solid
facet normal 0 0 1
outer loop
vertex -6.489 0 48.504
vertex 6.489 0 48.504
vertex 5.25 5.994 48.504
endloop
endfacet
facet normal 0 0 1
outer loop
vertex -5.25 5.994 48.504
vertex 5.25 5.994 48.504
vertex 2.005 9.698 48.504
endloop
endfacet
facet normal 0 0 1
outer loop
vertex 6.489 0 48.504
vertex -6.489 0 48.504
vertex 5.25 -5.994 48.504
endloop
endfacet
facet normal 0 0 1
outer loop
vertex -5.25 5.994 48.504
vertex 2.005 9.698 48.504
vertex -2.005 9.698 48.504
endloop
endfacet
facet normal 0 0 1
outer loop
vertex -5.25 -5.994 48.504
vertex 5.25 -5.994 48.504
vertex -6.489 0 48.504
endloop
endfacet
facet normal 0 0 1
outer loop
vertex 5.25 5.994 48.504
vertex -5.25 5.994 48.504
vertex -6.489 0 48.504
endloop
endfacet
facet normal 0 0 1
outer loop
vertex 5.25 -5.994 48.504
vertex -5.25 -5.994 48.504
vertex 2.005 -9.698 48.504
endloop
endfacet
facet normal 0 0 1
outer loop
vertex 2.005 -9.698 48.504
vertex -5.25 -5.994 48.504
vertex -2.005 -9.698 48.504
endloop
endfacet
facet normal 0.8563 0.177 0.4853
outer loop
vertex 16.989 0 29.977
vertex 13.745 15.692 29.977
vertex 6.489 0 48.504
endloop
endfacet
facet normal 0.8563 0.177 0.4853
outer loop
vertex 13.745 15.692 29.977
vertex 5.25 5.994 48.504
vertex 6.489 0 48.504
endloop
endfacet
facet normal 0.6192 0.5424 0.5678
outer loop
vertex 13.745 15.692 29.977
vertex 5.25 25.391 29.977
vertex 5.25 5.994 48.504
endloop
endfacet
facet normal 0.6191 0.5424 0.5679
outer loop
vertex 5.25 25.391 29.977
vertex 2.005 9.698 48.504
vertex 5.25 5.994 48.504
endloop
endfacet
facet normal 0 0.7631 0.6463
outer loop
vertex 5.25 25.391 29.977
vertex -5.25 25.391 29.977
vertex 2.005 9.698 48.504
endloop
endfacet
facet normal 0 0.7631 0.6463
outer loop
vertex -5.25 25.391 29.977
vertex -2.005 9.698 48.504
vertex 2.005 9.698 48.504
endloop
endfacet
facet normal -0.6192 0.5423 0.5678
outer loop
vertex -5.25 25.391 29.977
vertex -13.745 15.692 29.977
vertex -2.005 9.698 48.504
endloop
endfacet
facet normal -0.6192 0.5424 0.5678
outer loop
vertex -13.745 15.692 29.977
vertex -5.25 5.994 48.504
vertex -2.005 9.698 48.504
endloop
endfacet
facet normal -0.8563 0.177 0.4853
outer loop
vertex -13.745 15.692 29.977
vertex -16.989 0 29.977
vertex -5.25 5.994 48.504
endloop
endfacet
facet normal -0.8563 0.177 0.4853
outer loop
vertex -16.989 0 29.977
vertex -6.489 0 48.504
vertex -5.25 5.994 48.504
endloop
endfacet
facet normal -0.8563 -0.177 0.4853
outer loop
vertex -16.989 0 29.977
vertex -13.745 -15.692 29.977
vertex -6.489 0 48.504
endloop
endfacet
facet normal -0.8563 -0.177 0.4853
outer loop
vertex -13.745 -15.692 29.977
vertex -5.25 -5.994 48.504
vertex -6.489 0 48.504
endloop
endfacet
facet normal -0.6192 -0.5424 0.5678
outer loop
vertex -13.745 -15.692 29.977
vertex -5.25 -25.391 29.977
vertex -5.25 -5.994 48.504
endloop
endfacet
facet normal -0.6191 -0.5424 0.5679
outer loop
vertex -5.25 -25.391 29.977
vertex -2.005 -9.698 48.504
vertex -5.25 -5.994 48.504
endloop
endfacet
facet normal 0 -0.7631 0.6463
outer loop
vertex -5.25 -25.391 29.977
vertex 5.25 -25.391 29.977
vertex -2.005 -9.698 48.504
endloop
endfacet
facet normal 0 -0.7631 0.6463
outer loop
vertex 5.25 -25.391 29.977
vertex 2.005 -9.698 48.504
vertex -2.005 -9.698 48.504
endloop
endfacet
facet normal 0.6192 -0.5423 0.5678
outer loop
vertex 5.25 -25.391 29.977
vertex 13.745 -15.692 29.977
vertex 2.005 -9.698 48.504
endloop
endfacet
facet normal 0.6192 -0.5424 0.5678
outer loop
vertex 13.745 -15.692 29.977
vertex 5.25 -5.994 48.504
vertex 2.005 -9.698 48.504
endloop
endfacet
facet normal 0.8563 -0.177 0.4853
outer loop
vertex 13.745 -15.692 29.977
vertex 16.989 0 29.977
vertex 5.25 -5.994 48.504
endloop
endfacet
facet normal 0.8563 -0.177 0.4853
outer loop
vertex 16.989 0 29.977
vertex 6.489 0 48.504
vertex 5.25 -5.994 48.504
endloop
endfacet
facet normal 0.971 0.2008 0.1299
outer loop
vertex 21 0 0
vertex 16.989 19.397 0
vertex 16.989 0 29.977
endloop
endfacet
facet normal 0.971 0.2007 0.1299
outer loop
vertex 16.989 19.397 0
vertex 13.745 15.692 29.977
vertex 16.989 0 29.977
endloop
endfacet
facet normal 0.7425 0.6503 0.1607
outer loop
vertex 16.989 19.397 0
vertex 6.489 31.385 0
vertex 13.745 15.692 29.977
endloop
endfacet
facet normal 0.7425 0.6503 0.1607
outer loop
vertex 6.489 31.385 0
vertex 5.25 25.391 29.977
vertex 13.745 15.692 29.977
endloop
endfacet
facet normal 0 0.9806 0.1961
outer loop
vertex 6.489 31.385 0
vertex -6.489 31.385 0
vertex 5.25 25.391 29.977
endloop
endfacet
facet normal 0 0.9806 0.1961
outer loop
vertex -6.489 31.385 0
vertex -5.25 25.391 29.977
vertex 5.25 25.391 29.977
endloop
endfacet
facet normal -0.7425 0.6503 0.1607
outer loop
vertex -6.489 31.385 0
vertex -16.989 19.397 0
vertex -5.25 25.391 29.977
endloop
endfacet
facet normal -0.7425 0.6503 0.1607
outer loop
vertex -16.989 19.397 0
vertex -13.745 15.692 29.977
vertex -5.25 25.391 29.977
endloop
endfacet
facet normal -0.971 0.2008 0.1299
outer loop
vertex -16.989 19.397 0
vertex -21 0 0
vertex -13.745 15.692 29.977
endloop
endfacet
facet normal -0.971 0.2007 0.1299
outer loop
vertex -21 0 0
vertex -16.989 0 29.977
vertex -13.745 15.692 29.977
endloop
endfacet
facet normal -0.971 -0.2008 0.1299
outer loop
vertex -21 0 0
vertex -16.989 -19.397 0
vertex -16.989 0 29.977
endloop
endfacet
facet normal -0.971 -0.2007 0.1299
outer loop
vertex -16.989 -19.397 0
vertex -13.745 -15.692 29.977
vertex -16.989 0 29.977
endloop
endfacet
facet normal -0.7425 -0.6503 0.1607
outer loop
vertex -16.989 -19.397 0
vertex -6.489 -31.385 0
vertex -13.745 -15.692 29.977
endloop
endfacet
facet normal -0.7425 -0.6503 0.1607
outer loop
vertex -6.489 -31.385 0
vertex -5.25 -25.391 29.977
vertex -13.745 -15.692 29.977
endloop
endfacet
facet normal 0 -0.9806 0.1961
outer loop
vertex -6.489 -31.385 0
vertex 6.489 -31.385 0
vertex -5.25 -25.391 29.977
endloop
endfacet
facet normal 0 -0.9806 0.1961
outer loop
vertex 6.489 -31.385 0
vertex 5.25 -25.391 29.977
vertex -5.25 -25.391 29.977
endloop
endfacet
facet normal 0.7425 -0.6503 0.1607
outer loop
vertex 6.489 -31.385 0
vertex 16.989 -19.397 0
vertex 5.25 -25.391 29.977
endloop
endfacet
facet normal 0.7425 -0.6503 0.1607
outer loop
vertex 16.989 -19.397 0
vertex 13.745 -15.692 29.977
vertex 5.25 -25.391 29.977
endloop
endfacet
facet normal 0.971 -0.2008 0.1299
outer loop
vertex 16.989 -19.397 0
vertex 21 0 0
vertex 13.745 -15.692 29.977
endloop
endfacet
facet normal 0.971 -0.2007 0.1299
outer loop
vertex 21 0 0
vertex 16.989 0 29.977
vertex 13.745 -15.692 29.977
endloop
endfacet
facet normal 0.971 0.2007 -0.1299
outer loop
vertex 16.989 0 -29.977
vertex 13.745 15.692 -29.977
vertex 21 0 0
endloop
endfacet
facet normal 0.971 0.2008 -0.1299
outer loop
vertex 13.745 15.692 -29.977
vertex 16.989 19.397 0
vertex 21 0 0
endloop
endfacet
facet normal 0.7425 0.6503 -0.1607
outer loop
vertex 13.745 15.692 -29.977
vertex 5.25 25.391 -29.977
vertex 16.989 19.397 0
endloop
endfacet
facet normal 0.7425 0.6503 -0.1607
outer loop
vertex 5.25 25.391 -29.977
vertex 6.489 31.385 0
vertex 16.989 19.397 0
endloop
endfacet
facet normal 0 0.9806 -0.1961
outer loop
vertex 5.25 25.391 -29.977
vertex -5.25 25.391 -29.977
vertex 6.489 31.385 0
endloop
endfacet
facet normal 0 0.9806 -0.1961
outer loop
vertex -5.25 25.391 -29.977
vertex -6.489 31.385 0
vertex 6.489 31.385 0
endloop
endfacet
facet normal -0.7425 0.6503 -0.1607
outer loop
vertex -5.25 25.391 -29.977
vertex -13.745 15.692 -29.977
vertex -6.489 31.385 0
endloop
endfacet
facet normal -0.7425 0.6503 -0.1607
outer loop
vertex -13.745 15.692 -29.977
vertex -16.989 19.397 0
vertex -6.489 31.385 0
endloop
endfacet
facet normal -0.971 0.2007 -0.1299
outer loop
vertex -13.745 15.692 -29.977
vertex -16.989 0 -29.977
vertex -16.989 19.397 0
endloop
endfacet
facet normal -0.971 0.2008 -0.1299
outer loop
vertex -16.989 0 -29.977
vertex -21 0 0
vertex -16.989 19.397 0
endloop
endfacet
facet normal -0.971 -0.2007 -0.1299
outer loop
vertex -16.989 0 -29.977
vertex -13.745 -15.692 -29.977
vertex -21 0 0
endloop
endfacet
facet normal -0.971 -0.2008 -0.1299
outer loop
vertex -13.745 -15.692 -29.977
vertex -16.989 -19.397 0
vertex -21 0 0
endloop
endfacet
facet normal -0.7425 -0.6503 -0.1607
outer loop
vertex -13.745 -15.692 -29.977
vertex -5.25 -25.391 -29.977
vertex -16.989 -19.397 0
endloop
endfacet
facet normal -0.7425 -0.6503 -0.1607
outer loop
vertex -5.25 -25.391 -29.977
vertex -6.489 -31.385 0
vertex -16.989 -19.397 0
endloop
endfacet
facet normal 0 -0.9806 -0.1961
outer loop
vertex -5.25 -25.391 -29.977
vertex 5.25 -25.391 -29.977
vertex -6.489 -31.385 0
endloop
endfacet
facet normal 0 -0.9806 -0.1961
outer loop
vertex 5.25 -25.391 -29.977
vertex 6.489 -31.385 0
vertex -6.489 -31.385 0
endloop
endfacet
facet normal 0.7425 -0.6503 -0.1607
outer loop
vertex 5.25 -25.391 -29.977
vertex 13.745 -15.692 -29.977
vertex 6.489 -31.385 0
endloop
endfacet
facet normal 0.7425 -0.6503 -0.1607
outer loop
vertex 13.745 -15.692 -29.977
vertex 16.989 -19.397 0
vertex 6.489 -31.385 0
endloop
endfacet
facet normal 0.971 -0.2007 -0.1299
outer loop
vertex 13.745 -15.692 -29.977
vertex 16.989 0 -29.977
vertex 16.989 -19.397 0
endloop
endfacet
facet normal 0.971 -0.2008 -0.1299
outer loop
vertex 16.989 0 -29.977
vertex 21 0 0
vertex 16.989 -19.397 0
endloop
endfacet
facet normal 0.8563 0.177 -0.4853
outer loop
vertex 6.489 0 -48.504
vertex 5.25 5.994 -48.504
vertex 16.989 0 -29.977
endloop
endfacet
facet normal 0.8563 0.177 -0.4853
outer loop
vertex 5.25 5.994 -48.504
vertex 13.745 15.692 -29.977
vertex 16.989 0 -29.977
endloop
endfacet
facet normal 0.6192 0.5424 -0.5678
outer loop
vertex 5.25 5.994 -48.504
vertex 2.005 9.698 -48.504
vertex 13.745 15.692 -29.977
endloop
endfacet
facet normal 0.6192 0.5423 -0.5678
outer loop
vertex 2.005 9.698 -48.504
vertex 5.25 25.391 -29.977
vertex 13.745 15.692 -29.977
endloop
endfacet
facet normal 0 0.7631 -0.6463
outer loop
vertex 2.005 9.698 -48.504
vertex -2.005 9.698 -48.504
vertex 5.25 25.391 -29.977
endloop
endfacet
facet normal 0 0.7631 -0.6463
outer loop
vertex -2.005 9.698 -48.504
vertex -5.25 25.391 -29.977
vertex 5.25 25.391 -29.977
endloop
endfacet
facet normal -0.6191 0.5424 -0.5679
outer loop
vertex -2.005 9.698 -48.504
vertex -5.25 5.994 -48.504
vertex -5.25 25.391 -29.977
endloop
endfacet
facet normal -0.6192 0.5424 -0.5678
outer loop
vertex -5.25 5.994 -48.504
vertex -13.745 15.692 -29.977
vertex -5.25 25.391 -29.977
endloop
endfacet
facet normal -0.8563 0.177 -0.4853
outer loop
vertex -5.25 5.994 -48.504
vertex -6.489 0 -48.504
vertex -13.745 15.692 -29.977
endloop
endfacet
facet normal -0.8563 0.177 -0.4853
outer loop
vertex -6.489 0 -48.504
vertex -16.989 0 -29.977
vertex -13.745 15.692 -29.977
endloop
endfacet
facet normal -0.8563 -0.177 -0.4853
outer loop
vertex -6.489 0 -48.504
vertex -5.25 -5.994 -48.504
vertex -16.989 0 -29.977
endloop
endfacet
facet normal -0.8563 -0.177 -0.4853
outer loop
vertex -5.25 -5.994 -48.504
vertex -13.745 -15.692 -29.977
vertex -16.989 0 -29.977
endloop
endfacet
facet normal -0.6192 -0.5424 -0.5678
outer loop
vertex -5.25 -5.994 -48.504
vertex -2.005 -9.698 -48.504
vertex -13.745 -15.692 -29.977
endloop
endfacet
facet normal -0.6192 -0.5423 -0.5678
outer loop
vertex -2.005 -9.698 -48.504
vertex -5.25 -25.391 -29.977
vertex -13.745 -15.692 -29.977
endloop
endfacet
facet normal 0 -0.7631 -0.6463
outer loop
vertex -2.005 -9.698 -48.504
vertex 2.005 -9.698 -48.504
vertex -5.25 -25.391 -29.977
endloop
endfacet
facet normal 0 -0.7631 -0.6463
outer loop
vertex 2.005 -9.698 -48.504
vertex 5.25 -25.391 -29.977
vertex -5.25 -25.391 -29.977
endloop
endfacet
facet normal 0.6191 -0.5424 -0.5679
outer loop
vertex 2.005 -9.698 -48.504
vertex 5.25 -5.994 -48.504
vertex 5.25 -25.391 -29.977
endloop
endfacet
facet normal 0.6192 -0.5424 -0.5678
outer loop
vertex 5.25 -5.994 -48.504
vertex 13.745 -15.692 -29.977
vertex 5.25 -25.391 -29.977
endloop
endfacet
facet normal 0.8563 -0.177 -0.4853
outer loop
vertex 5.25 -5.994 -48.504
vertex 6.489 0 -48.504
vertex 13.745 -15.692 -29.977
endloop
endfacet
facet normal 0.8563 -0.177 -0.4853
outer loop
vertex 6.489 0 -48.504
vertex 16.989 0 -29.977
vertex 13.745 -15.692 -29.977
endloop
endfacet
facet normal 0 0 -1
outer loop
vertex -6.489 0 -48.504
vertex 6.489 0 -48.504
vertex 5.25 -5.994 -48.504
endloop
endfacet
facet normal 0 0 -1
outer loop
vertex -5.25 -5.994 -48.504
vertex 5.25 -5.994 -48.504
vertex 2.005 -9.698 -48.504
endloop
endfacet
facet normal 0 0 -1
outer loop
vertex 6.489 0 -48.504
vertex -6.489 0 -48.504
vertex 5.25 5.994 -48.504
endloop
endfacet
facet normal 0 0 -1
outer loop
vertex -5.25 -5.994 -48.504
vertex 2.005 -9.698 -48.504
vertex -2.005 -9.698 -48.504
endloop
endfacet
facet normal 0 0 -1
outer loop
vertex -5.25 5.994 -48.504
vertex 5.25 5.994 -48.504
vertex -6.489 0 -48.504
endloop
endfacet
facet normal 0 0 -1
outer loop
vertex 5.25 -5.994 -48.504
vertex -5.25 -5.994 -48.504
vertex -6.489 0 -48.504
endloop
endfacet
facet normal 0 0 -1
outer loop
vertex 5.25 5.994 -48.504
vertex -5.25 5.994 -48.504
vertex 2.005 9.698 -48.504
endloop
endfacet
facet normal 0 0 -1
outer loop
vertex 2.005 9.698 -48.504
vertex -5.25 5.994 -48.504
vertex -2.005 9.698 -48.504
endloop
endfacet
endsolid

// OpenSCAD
// Generated by SolidPython 1.0.1 on 2020-07-29 00:46:47


scale(v = [7, 11, 17]) {
	sphere(r = 3);
}
/***********************************************
*********      SolidPython code:      **********
************************************************
 
# import packages: SolidPython
from solid import *
from solid.utils import *
from itertools import chain, combinations, permutations


class Resize:

    def __init__(self, scad_file):
        self.scad_file = scad_file
        #self.scad_file = import_scad(scad_file)
        # cone/cylinder param:
        self.r1 = 0
        self.r2 = 0
        self.h = 0
        # rectangular prism param:
        self.w = 0
        self.l = 0
        # ellipse param:
        self.r = 0

    # import OpenScad code (file name corresponds to shape)


    # classify shape + parameters
    def assign(self, param1, param2, param3):
        if self.scad_file == 'cone.scad':
            self.r1 = param1
            self.r2 = param2
            self.h = param3
        elif self.scad_file == 'cylinder.scad':
            self.r1 = param1
            self.r2 = param2
            self.h = param3
        elif self.scad_file == 'rectangularPrism.scad':
            self.h = param1
            self.l = param2
            self.w = param3
        else:
            self.r = param1
            self.h = param2

    # resize parameters
    def iterate(self):
        x = range(3, 20, 2)
        i = 1
        if self.scad_file == 'cone.scad':
            tempList = list(permutations(x, 2))
            for temp in tempList:
                param1 = temp[0]
                param2 = temp[1]
                filepath = 'produced_scad_files/' + 'cone' + str(param1) + '_' + str(param2) + '_' + '.scad'
                scad_render_to_file(cylinder(h=param1, r1=param2, r2=0), filepath)

        elif self.scad_file == 'cylinder.scad':
            tempList = list(permutations(x, 3))
            for temp in tempList:
                param1 = temp[0]
                param2 = temp[1]
                filepath = 'produced_scad_files/' + 'cylinder' + str(param1) + '_' + str(param2) + '_' + '.scad'
                scad_render_to_file(cylinder(h=param1, r1=param2, r2=param2), filepath)

        elif self.scad_file == 'rectangularPrism.scad':
            tempList = list(permutations(x, 3))
            for temp in tempList:
                param1 = temp[0]
                param2 = temp[1]
                param3 = temp[2]
                filepath = 'produced_scad_files/' + 'rectangularPrism' + str(param1) + '_' + str(param2) + '_' + str(
                    param3) + '.scad'
                scad_render_to_file(cube(size=(param1, param2, param3)), filepath)

        elif self.scad_file == 'ellipse.scad':
            tempList = list(permutations(x, 4))
            for temp in tempList:
                param1 = temp[0]
                param2 = temp[1]
                param3 = temp[2]
                param4 = temp[3]
                filepath = 'produced_scad_files/' + 'ellipse' + str(param1) + '_' + str(param2) + '_' + str(param3) + '_' + str(param4) + '.scad'
                scad_render_to_file(scale([param1, param2, param3])(sphere(r=param4)), filepath)

    def render_to_scadfile(self):
        scad_render_to_file(scad, 'example.scad') 
 
************************************************/
